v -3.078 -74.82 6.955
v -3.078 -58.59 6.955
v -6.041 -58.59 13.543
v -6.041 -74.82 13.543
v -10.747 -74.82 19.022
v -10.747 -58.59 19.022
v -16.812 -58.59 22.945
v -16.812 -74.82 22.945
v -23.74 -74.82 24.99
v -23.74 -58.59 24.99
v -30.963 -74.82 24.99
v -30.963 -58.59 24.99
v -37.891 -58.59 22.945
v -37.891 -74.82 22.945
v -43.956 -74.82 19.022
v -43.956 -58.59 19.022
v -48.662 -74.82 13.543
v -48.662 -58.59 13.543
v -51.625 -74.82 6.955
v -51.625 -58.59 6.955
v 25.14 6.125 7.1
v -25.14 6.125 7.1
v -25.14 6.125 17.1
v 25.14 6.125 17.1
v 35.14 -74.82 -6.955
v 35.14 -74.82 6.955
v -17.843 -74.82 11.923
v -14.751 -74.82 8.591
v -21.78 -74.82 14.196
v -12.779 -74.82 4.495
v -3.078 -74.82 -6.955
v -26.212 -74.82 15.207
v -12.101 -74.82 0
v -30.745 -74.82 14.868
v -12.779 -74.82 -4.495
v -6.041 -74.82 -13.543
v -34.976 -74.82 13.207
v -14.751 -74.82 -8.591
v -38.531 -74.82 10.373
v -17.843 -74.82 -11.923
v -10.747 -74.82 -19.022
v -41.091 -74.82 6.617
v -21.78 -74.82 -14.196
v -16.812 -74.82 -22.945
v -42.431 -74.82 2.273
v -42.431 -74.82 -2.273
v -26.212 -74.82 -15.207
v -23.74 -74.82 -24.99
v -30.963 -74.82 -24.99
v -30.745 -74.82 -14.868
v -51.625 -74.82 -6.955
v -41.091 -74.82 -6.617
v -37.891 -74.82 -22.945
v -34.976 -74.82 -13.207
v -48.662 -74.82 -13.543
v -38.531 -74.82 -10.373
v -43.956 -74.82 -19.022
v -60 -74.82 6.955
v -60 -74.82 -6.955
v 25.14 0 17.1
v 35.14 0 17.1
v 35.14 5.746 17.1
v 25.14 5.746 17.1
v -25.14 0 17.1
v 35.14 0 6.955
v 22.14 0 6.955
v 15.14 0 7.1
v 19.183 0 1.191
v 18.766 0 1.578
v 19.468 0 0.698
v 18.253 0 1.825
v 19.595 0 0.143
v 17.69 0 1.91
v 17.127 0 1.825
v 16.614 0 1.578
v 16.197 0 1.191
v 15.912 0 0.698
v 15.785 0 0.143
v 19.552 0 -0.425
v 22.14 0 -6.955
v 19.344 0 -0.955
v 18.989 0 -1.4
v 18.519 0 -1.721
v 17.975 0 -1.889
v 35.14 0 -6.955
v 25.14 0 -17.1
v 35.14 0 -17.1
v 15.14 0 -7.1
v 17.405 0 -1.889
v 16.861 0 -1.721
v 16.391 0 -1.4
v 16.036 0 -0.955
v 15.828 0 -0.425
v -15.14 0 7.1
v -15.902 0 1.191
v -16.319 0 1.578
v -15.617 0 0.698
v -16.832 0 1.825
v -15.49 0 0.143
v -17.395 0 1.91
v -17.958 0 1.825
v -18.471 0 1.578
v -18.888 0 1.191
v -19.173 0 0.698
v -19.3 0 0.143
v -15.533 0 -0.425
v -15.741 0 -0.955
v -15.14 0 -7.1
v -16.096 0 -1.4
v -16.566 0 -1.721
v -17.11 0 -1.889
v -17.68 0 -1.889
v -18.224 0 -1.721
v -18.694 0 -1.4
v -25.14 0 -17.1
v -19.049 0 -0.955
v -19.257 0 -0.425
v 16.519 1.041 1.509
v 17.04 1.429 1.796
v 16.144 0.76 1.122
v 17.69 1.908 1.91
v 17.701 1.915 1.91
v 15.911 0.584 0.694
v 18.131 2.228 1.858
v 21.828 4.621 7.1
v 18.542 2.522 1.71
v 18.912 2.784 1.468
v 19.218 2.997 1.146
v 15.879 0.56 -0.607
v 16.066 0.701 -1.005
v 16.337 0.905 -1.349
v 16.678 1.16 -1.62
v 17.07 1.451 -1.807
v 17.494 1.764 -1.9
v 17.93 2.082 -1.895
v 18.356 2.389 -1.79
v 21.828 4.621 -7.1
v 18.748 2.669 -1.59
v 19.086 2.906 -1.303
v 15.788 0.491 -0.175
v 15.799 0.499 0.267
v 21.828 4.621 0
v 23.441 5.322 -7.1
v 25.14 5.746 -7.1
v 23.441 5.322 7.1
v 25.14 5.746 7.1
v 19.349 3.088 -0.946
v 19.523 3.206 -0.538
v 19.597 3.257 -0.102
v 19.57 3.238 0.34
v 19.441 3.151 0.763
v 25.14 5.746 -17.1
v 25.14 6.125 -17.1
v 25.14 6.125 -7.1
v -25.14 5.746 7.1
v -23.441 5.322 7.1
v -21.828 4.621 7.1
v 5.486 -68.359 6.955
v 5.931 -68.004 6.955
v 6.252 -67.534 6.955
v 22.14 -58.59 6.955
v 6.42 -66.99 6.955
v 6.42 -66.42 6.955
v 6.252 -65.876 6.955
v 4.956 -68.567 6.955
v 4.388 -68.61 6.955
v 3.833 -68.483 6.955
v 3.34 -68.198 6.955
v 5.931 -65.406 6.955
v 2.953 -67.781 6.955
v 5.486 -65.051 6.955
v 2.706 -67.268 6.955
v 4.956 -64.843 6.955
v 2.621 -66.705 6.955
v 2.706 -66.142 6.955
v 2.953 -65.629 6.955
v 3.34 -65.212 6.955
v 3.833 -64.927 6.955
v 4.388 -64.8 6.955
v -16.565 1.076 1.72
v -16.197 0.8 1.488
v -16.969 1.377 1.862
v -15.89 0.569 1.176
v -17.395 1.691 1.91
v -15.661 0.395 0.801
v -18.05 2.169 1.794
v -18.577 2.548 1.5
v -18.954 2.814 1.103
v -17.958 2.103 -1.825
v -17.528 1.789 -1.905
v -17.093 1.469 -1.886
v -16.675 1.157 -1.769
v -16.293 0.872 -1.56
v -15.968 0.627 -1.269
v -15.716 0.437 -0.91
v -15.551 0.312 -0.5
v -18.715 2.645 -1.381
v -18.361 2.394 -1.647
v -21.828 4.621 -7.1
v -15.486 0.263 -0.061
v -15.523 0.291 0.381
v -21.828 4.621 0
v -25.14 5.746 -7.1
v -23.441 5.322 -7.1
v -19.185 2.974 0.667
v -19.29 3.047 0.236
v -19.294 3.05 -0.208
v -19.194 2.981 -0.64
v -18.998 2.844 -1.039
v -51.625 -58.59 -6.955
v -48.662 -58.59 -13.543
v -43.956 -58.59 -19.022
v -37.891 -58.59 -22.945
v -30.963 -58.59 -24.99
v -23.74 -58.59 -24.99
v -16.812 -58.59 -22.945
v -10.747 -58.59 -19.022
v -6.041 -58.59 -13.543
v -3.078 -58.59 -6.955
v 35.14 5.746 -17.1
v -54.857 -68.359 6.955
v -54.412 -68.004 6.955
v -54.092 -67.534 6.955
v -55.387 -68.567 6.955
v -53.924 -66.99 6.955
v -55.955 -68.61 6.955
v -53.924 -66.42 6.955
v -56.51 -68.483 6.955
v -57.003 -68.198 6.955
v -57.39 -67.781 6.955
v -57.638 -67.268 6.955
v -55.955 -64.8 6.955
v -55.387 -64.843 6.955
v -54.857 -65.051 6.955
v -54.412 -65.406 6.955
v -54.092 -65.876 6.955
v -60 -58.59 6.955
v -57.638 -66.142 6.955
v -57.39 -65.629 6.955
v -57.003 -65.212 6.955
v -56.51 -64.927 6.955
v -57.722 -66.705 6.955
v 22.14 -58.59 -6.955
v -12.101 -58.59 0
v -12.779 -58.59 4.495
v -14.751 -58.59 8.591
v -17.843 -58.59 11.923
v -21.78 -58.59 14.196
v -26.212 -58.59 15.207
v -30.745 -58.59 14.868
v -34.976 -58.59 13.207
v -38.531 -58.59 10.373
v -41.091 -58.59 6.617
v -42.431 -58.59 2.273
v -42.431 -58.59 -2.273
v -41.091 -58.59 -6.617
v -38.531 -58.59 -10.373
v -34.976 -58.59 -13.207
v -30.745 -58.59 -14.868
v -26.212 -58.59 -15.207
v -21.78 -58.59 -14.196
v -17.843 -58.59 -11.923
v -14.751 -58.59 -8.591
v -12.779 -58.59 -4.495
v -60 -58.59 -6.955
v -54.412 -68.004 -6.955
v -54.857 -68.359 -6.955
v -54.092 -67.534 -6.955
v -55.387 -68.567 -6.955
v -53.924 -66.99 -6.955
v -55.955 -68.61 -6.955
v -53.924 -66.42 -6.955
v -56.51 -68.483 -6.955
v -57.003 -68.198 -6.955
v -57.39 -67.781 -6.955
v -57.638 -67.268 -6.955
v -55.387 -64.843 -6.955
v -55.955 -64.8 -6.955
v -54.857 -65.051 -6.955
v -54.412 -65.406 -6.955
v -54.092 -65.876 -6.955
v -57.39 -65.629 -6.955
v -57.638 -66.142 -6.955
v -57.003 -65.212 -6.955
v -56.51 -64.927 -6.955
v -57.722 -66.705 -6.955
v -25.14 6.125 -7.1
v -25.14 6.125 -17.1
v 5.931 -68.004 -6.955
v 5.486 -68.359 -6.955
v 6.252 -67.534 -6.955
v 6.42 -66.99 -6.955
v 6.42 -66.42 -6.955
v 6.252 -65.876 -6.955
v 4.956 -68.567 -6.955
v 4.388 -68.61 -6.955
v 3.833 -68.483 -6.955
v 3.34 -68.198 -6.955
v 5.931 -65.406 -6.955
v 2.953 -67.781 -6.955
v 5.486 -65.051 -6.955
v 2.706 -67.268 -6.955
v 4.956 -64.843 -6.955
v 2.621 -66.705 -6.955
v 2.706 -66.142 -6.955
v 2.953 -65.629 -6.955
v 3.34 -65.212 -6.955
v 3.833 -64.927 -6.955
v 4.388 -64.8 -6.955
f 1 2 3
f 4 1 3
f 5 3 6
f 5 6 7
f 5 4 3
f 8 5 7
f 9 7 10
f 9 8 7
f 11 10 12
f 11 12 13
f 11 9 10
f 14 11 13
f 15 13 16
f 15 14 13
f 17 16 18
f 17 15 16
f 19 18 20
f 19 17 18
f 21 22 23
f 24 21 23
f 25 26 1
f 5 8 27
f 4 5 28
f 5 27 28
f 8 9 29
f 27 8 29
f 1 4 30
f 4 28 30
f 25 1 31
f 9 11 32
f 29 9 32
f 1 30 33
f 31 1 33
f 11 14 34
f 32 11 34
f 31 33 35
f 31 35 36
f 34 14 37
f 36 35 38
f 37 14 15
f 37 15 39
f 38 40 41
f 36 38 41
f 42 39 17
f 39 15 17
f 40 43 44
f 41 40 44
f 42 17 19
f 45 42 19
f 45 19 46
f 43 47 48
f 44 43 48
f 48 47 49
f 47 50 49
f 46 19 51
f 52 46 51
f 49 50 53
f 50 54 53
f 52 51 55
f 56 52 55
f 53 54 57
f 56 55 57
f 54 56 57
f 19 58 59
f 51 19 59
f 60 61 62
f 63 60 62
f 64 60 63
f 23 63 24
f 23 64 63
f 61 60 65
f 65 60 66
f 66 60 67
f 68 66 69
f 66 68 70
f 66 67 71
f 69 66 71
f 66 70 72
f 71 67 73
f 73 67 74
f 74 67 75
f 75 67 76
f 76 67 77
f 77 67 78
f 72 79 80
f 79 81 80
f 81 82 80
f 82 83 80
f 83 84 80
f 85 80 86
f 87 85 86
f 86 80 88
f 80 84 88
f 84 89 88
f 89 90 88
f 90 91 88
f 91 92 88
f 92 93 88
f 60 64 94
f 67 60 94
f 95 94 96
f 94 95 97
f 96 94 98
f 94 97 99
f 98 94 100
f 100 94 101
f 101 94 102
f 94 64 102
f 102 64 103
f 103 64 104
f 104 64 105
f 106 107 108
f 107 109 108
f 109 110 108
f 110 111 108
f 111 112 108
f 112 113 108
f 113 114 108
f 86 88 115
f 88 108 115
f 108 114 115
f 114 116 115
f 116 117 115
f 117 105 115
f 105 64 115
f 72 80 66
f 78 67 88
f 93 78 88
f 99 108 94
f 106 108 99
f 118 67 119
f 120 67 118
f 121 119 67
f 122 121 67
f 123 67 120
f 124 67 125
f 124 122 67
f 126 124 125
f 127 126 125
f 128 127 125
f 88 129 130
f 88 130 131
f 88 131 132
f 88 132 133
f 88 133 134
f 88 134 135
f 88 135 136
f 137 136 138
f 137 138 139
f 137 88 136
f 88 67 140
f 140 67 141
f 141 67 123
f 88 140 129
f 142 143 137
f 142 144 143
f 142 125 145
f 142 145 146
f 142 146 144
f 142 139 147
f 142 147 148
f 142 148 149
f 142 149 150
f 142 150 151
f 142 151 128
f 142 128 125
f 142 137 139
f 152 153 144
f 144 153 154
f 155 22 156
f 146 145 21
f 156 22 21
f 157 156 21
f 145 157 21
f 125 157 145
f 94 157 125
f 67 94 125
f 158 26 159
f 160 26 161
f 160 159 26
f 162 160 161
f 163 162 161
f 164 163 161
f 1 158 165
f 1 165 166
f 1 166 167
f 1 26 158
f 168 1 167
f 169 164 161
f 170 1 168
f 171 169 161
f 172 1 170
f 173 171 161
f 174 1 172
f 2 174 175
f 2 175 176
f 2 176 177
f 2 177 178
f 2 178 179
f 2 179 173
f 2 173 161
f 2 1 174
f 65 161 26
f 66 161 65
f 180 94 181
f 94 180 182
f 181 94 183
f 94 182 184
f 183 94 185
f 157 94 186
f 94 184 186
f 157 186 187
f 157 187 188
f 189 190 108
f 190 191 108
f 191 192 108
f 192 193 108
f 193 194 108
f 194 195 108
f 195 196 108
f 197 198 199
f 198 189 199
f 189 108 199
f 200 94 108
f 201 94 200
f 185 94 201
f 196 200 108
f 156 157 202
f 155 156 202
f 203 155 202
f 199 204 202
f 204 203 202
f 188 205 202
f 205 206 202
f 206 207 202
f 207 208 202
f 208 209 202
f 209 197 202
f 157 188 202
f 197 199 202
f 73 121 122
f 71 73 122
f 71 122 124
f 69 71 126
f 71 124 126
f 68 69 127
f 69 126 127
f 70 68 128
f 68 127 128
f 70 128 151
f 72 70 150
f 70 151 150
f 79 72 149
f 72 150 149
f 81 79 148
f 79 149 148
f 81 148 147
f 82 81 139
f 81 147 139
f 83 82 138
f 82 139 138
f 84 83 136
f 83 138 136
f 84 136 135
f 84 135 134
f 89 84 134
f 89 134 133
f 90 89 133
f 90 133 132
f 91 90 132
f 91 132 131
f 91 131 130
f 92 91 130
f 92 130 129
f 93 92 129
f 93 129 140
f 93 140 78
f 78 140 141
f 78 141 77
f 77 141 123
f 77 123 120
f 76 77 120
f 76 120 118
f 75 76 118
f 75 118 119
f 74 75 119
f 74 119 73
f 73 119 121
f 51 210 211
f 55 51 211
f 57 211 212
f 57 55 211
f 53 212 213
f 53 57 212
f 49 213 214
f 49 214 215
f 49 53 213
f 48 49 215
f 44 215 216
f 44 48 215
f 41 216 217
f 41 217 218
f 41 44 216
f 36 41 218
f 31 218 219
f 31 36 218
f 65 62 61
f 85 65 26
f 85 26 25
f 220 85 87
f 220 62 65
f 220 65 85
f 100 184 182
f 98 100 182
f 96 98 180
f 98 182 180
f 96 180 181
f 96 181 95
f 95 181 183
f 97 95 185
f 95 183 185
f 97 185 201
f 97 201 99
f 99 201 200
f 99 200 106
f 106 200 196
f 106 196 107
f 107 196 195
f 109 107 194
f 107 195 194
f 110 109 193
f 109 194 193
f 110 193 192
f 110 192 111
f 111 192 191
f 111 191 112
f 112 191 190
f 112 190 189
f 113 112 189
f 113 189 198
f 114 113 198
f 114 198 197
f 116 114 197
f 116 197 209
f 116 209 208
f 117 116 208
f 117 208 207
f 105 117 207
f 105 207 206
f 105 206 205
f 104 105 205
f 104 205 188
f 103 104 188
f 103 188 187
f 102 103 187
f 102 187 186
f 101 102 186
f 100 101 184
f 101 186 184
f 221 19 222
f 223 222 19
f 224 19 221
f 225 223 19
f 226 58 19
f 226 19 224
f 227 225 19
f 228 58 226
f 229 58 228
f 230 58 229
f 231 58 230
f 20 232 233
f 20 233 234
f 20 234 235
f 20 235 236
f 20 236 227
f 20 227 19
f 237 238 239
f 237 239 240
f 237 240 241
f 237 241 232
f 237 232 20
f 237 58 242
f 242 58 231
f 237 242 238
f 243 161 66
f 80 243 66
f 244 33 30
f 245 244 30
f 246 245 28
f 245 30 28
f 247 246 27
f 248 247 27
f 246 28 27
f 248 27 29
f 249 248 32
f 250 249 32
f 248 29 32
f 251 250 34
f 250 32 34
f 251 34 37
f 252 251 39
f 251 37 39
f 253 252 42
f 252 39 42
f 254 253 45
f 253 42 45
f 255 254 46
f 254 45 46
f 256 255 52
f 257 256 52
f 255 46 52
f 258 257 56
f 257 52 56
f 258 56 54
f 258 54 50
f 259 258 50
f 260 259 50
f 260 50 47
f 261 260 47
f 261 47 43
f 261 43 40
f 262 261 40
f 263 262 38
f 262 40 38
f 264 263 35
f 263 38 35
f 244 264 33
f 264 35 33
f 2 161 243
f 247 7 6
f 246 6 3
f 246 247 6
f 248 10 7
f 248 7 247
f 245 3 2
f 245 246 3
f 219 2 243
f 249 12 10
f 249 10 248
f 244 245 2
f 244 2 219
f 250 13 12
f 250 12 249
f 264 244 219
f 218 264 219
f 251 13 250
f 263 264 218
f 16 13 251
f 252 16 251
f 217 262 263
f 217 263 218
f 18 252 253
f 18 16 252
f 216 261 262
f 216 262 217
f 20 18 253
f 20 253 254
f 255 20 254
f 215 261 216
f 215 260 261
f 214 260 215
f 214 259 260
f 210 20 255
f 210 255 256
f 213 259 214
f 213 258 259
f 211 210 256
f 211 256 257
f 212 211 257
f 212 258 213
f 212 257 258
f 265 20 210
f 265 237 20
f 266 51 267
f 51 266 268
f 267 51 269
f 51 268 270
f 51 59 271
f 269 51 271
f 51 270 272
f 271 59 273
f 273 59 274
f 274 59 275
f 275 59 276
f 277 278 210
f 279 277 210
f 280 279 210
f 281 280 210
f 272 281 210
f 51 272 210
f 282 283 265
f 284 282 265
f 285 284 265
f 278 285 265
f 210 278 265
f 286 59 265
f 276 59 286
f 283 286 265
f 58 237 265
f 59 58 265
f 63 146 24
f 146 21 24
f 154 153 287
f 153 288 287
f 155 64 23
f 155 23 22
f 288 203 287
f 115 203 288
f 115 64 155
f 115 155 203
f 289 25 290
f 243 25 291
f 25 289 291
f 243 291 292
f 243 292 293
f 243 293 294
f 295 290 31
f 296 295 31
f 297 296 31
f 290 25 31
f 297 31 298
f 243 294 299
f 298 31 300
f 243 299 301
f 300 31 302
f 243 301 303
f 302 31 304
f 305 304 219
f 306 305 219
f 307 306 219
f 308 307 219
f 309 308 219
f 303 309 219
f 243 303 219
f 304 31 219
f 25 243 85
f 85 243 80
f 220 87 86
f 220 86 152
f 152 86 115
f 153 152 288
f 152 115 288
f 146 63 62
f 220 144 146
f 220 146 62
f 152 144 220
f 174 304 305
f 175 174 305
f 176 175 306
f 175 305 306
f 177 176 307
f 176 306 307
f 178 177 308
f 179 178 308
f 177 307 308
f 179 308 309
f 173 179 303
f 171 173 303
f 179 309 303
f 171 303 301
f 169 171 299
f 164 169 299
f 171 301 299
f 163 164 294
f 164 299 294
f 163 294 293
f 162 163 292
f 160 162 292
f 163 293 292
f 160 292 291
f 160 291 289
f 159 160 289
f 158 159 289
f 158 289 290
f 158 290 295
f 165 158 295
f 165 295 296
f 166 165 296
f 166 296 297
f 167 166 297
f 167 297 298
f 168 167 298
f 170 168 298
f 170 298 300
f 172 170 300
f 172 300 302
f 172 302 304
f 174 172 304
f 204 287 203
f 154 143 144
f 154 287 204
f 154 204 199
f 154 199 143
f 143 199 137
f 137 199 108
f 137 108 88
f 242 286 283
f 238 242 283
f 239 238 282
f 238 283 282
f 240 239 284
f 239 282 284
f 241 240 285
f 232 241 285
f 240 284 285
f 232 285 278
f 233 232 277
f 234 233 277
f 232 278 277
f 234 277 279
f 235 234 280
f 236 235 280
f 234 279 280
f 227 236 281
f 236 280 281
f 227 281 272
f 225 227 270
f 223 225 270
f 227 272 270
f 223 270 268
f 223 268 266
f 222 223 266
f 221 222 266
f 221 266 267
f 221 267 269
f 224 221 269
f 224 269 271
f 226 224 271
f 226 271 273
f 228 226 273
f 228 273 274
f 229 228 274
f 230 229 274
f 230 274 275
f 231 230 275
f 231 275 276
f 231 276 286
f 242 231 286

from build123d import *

# Parameters (mm, degrees)
SKETCH_1_W           = 50.28
SKETCH_1_H           = 34.2
SKETCH_1_W_2         = 30.28
SKETCH_1_H_2         = 14.2
EXTRUDE_1_DEPTH      = 12.25
SKETCH_4_W           = 13
SKETCH_4_H           = 13.91
EXTRUDE_1_2_DEPTH    = 74.82
SKETCH_5_W           = 13.91
SKETCH_5_H           = 16.23
EXTRUDE_2_DEPTH      = 16
SKETCH_7_R           = 25.25
SKETCH_7_R_2         = 15.25
EXTRUDE_2_2_DEPTH    = 16.23
SKETCH_15_R          = 1.91
CUT_EXTRUDE_6_DEPTH  = 97.964478439
SKETCH_16_W          = 13.91
SKETCH_16_H          = 16.23
EXTRUDE_4_DEPTH      = 10
SKETCH_17_R          = 1.91
CUT_EXTRUDE_7_DEPTH  = 102.16913771
SKETCH_18_W          = 49.344544624
SKETCH_18_H          = 6.125
CUT_EXTRUDE_8_DEPTH  = 105.840616652
SKETCH_19_W          = 34.2
SKETCH_19_H          = 6.125
CUT_EXTRUDE_9_DEPTH  = 10
SKETCH_21_R          = 1.91
CUT_EXTRUDE_10_DEPTH = 10
SKETCH_20_R          = 1.91
CUT_EXTRUDE_11_DEPTH = 10
FILLET_START         = -7.1
FILLET_1_DEPTH       = 14.2
FILLET_2_DEPTH       = 14.2
SKETCH_29_W          = 13.91
SKETCH_29_H          = 74.82
EXTRUDE_5_DEPTH      = 10
SKETCH_30_W          = 10
SKETCH_30_H          = 58.59
CUT_EXTRUDE_13_DEPTH = 102.16913771
SKETCH_32_W          = 34.2
SKETCH_32_H          = 5.745736365
EXTRUDE_6_DEPTH      = 10


with BuildPart() as part:
    # 草圖1 → Extrude 1 (new body)
    with BuildSketch(Plane(origin=(0, 0, 0), x_dir=(1, 0, 0), z_dir=(0, 1, 0))):
        Rectangle(SKETCH_1_W, SKETCH_1_H)
        Rectangle(SKETCH_1_W_2, SKETCH_1_H_2, mode=Mode.SUBTRACT)
    extrude(amount=EXTRUDE_1_DEPTH)

    # 草圖4 → Extrude 1 2 (add)
    with BuildSketch(Plane.XZ):
        with Locations((18.64, 0)):
            Rectangle(SKETCH_4_W, SKETCH_4_H)
    extrude(amount=EXTRUDE_1_2_DEPTH)

    # 草圖5 → Extrude 2 (add)
    with BuildSketch(Plane.ZY.offset(-12.14)):
        with Locations((0, -66.705)):
            Rectangle(SKETCH_5_W, SKETCH_5_H)
    extrude(amount=EXTRUDE_2_DEPTH)

    # 草圖7 → Extrude 2 2 (add)
    with BuildSketch(Plane(origin=(3.626674765, -74.82, 0), x_dir=(1, 0, 0), z_dir=(0, -1, 0))):
        with Locations((-30.978154344, 0)):
            Circle(SKETCH_7_R)
        with Locations((-30.978154344, 0)):
            Circle(SKETCH_7_R_2, mode=Mode.SUBTRACT)
    extrude(amount=-EXTRUDE_2_2_DEPTH)

    # 草圖15 → 除料-伸長6 (cut, through all)
    with BuildSketch(Plane(origin=(0, 0, -6.955), x_dir=(-1, 0, 0), z_dir=(0, 0, -1))):
        with Locations((-4.530883248, -66.705)):
            Circle(SKETCH_15_R)
    extrude(amount=-CUT_EXTRUDE_6_DEPTH, mode=Mode.SUBTRACT)

    # 草圖16 → 填料-伸長4 (add)
    with BuildSketch(Plane(origin=(-60, 0, 0), x_dir=(0, 0, -1), z_dir=(1, 0, 0))):
        with Locations((0, -66.705)):
            Rectangle(SKETCH_16_W, SKETCH_16_H)
    extrude(amount=EXTRUDE_4_DEPTH)

    # 草圖17 → 除料-伸長7 (cut, through all)
    with BuildSketch(Plane(origin=(0, 0, -6.955), x_dir=(-1, 0, 0), z_dir=(0, 0, -1))):
        with Locations((55.812362827, -66.705)):
            Circle(SKETCH_17_R)
    extrude(amount=-CUT_EXTRUDE_7_DEPTH, mode=Mode.SUBTRACT)

    # 草圖18 → 除料-伸長8 (cut, through all)
    with BuildSketch(Plane(origin=(0, 0, -17.1), x_dir=(-1, 0, 0), z_dir=(0, 0, -1))):
        with Locations((0.467727688, 9.1875)):
            Rectangle(SKETCH_18_W, SKETCH_18_H)
    extrude(amount=-CUT_EXTRUDE_8_DEPTH, mode=Mode.SUBTRACT)

    # 草圖19 → 除料-伸長9 (cut)
    with BuildSketch(Plane.ZY.offset(-24.204544624)):
        with Locations((0, 9.1875)):
            Rectangle(SKETCH_19_W, SKETCH_19_H)
    extrude(amount=-CUT_EXTRUDE_9_DEPTH, mode=Mode.SUBTRACT)

    # 草圖21 → 除料-伸長10 (cut)
    with BuildSketch(Plane(origin=(0, 6.125, 0), x_dir=(1, 0, 0), z_dir=(0, 1, 0))):
        with Locations(Location((17.69, 0, 0), (0, 0, 270))):
            Circle(SKETCH_21_R)
    extrude(amount=-CUT_EXTRUDE_10_DEPTH, mode=Mode.SUBTRACT)

    # 草圖20 → 除料-伸長11 (cut)
    with BuildSketch(Plane(origin=(0, 6.125, 0), x_dir=(1, 0, 0), z_dir=(0, 1, 0))):
        with Locations(Location((-17.395, 0, 0), (0, 0, 270))):
            Circle(SKETCH_20_R)
    extrude(amount=-CUT_EXTRUDE_11_DEPTH, mode=Mode.SUBTRACT)

    # 圓角1: read off the stored shape, not the designer's step
    # 圓角1 outline → 圓角1 (cut)
    with BuildSketch(Plane.XY.offset(FILLET_START)):
        with BuildLine():
            add(Edge.make_bspline(
                [(-15.14, 0), (-21.974170252, 5.199829476), (-25.14, 5.745736365)],
                knots=[0, 0, 0, 0.664102345, 0.664102345, 0.664102345], degree=2, weights=[1, 2.223777218, 1.822127795]))
            Line((-15.14, 0), (-15.14, 6.125))
            Line((-15.14, 6.125), (-25.14, 6.125))
            Line((-25.14, 6.125), (-25.14, 5.745736365))
        make_face()
    extrude(amount=FILLET_1_DEPTH, mode=Mode.SUBTRACT)

    # 圓角2: read off the stored shape, not the designer's step
    # 圓角2 outline → 圓角2 (cut)
    with BuildSketch(Plane.XY.offset(FILLET_START)):
        with BuildLine():
            Line((15.14, 6.125), (15.14, 0))
            add(Edge.make_bspline(
                [(15.14, 0), (21.974170252, 5.199829476), (25.14, 5.745736365)],
                knots=[0, 0, 0, 0.664102345, 0.664102345, 0.664102345], degree=2, weights=[1, 2.223777218, 1.822127795]))
            Line((25.14, 5.745736365), (25.14, 6.125))
            Line((25.14, 6.125), (15.14, 6.125))
        make_face()
    extrude(amount=FILLET_2_DEPTH, mode=Mode.SUBTRACT)

    # 草圖29 → 填料-伸長5 (add)
    with BuildSketch(Plane(origin=(25.14, 0, 0), x_dir=(0, 0, -1), z_dir=(1, 0, 0))):
        with Locations((0, -37.41)):
            Rectangle(SKETCH_29_W, SKETCH_29_H)
    extrude(amount=EXTRUDE_5_DEPTH)

    # 草圖30 → 除料-伸長13 (cut, through all)
    with BuildSketch(Plane.XY.offset(6.955)):
        with Locations((17.14, -29.295)):
            Rectangle(SKETCH_30_W, SKETCH_30_H)
    extrude(amount=-CUT_EXTRUDE_13_DEPTH, mode=Mode.SUBTRACT)

    # 草圖32 → 填料-伸長6 (add)
    with BuildSketch(Plane(origin=(25.14, 0, 0), x_dir=(0, 0, -1), z_dir=(1, 0, 0))):
        with Locations((0, 2.872868182)):
            Rectangle(SKETCH_32_W, SKETCH_32_H)
    extrude(amount=EXTRUDE_6_DEPTH)


solid = part.part
